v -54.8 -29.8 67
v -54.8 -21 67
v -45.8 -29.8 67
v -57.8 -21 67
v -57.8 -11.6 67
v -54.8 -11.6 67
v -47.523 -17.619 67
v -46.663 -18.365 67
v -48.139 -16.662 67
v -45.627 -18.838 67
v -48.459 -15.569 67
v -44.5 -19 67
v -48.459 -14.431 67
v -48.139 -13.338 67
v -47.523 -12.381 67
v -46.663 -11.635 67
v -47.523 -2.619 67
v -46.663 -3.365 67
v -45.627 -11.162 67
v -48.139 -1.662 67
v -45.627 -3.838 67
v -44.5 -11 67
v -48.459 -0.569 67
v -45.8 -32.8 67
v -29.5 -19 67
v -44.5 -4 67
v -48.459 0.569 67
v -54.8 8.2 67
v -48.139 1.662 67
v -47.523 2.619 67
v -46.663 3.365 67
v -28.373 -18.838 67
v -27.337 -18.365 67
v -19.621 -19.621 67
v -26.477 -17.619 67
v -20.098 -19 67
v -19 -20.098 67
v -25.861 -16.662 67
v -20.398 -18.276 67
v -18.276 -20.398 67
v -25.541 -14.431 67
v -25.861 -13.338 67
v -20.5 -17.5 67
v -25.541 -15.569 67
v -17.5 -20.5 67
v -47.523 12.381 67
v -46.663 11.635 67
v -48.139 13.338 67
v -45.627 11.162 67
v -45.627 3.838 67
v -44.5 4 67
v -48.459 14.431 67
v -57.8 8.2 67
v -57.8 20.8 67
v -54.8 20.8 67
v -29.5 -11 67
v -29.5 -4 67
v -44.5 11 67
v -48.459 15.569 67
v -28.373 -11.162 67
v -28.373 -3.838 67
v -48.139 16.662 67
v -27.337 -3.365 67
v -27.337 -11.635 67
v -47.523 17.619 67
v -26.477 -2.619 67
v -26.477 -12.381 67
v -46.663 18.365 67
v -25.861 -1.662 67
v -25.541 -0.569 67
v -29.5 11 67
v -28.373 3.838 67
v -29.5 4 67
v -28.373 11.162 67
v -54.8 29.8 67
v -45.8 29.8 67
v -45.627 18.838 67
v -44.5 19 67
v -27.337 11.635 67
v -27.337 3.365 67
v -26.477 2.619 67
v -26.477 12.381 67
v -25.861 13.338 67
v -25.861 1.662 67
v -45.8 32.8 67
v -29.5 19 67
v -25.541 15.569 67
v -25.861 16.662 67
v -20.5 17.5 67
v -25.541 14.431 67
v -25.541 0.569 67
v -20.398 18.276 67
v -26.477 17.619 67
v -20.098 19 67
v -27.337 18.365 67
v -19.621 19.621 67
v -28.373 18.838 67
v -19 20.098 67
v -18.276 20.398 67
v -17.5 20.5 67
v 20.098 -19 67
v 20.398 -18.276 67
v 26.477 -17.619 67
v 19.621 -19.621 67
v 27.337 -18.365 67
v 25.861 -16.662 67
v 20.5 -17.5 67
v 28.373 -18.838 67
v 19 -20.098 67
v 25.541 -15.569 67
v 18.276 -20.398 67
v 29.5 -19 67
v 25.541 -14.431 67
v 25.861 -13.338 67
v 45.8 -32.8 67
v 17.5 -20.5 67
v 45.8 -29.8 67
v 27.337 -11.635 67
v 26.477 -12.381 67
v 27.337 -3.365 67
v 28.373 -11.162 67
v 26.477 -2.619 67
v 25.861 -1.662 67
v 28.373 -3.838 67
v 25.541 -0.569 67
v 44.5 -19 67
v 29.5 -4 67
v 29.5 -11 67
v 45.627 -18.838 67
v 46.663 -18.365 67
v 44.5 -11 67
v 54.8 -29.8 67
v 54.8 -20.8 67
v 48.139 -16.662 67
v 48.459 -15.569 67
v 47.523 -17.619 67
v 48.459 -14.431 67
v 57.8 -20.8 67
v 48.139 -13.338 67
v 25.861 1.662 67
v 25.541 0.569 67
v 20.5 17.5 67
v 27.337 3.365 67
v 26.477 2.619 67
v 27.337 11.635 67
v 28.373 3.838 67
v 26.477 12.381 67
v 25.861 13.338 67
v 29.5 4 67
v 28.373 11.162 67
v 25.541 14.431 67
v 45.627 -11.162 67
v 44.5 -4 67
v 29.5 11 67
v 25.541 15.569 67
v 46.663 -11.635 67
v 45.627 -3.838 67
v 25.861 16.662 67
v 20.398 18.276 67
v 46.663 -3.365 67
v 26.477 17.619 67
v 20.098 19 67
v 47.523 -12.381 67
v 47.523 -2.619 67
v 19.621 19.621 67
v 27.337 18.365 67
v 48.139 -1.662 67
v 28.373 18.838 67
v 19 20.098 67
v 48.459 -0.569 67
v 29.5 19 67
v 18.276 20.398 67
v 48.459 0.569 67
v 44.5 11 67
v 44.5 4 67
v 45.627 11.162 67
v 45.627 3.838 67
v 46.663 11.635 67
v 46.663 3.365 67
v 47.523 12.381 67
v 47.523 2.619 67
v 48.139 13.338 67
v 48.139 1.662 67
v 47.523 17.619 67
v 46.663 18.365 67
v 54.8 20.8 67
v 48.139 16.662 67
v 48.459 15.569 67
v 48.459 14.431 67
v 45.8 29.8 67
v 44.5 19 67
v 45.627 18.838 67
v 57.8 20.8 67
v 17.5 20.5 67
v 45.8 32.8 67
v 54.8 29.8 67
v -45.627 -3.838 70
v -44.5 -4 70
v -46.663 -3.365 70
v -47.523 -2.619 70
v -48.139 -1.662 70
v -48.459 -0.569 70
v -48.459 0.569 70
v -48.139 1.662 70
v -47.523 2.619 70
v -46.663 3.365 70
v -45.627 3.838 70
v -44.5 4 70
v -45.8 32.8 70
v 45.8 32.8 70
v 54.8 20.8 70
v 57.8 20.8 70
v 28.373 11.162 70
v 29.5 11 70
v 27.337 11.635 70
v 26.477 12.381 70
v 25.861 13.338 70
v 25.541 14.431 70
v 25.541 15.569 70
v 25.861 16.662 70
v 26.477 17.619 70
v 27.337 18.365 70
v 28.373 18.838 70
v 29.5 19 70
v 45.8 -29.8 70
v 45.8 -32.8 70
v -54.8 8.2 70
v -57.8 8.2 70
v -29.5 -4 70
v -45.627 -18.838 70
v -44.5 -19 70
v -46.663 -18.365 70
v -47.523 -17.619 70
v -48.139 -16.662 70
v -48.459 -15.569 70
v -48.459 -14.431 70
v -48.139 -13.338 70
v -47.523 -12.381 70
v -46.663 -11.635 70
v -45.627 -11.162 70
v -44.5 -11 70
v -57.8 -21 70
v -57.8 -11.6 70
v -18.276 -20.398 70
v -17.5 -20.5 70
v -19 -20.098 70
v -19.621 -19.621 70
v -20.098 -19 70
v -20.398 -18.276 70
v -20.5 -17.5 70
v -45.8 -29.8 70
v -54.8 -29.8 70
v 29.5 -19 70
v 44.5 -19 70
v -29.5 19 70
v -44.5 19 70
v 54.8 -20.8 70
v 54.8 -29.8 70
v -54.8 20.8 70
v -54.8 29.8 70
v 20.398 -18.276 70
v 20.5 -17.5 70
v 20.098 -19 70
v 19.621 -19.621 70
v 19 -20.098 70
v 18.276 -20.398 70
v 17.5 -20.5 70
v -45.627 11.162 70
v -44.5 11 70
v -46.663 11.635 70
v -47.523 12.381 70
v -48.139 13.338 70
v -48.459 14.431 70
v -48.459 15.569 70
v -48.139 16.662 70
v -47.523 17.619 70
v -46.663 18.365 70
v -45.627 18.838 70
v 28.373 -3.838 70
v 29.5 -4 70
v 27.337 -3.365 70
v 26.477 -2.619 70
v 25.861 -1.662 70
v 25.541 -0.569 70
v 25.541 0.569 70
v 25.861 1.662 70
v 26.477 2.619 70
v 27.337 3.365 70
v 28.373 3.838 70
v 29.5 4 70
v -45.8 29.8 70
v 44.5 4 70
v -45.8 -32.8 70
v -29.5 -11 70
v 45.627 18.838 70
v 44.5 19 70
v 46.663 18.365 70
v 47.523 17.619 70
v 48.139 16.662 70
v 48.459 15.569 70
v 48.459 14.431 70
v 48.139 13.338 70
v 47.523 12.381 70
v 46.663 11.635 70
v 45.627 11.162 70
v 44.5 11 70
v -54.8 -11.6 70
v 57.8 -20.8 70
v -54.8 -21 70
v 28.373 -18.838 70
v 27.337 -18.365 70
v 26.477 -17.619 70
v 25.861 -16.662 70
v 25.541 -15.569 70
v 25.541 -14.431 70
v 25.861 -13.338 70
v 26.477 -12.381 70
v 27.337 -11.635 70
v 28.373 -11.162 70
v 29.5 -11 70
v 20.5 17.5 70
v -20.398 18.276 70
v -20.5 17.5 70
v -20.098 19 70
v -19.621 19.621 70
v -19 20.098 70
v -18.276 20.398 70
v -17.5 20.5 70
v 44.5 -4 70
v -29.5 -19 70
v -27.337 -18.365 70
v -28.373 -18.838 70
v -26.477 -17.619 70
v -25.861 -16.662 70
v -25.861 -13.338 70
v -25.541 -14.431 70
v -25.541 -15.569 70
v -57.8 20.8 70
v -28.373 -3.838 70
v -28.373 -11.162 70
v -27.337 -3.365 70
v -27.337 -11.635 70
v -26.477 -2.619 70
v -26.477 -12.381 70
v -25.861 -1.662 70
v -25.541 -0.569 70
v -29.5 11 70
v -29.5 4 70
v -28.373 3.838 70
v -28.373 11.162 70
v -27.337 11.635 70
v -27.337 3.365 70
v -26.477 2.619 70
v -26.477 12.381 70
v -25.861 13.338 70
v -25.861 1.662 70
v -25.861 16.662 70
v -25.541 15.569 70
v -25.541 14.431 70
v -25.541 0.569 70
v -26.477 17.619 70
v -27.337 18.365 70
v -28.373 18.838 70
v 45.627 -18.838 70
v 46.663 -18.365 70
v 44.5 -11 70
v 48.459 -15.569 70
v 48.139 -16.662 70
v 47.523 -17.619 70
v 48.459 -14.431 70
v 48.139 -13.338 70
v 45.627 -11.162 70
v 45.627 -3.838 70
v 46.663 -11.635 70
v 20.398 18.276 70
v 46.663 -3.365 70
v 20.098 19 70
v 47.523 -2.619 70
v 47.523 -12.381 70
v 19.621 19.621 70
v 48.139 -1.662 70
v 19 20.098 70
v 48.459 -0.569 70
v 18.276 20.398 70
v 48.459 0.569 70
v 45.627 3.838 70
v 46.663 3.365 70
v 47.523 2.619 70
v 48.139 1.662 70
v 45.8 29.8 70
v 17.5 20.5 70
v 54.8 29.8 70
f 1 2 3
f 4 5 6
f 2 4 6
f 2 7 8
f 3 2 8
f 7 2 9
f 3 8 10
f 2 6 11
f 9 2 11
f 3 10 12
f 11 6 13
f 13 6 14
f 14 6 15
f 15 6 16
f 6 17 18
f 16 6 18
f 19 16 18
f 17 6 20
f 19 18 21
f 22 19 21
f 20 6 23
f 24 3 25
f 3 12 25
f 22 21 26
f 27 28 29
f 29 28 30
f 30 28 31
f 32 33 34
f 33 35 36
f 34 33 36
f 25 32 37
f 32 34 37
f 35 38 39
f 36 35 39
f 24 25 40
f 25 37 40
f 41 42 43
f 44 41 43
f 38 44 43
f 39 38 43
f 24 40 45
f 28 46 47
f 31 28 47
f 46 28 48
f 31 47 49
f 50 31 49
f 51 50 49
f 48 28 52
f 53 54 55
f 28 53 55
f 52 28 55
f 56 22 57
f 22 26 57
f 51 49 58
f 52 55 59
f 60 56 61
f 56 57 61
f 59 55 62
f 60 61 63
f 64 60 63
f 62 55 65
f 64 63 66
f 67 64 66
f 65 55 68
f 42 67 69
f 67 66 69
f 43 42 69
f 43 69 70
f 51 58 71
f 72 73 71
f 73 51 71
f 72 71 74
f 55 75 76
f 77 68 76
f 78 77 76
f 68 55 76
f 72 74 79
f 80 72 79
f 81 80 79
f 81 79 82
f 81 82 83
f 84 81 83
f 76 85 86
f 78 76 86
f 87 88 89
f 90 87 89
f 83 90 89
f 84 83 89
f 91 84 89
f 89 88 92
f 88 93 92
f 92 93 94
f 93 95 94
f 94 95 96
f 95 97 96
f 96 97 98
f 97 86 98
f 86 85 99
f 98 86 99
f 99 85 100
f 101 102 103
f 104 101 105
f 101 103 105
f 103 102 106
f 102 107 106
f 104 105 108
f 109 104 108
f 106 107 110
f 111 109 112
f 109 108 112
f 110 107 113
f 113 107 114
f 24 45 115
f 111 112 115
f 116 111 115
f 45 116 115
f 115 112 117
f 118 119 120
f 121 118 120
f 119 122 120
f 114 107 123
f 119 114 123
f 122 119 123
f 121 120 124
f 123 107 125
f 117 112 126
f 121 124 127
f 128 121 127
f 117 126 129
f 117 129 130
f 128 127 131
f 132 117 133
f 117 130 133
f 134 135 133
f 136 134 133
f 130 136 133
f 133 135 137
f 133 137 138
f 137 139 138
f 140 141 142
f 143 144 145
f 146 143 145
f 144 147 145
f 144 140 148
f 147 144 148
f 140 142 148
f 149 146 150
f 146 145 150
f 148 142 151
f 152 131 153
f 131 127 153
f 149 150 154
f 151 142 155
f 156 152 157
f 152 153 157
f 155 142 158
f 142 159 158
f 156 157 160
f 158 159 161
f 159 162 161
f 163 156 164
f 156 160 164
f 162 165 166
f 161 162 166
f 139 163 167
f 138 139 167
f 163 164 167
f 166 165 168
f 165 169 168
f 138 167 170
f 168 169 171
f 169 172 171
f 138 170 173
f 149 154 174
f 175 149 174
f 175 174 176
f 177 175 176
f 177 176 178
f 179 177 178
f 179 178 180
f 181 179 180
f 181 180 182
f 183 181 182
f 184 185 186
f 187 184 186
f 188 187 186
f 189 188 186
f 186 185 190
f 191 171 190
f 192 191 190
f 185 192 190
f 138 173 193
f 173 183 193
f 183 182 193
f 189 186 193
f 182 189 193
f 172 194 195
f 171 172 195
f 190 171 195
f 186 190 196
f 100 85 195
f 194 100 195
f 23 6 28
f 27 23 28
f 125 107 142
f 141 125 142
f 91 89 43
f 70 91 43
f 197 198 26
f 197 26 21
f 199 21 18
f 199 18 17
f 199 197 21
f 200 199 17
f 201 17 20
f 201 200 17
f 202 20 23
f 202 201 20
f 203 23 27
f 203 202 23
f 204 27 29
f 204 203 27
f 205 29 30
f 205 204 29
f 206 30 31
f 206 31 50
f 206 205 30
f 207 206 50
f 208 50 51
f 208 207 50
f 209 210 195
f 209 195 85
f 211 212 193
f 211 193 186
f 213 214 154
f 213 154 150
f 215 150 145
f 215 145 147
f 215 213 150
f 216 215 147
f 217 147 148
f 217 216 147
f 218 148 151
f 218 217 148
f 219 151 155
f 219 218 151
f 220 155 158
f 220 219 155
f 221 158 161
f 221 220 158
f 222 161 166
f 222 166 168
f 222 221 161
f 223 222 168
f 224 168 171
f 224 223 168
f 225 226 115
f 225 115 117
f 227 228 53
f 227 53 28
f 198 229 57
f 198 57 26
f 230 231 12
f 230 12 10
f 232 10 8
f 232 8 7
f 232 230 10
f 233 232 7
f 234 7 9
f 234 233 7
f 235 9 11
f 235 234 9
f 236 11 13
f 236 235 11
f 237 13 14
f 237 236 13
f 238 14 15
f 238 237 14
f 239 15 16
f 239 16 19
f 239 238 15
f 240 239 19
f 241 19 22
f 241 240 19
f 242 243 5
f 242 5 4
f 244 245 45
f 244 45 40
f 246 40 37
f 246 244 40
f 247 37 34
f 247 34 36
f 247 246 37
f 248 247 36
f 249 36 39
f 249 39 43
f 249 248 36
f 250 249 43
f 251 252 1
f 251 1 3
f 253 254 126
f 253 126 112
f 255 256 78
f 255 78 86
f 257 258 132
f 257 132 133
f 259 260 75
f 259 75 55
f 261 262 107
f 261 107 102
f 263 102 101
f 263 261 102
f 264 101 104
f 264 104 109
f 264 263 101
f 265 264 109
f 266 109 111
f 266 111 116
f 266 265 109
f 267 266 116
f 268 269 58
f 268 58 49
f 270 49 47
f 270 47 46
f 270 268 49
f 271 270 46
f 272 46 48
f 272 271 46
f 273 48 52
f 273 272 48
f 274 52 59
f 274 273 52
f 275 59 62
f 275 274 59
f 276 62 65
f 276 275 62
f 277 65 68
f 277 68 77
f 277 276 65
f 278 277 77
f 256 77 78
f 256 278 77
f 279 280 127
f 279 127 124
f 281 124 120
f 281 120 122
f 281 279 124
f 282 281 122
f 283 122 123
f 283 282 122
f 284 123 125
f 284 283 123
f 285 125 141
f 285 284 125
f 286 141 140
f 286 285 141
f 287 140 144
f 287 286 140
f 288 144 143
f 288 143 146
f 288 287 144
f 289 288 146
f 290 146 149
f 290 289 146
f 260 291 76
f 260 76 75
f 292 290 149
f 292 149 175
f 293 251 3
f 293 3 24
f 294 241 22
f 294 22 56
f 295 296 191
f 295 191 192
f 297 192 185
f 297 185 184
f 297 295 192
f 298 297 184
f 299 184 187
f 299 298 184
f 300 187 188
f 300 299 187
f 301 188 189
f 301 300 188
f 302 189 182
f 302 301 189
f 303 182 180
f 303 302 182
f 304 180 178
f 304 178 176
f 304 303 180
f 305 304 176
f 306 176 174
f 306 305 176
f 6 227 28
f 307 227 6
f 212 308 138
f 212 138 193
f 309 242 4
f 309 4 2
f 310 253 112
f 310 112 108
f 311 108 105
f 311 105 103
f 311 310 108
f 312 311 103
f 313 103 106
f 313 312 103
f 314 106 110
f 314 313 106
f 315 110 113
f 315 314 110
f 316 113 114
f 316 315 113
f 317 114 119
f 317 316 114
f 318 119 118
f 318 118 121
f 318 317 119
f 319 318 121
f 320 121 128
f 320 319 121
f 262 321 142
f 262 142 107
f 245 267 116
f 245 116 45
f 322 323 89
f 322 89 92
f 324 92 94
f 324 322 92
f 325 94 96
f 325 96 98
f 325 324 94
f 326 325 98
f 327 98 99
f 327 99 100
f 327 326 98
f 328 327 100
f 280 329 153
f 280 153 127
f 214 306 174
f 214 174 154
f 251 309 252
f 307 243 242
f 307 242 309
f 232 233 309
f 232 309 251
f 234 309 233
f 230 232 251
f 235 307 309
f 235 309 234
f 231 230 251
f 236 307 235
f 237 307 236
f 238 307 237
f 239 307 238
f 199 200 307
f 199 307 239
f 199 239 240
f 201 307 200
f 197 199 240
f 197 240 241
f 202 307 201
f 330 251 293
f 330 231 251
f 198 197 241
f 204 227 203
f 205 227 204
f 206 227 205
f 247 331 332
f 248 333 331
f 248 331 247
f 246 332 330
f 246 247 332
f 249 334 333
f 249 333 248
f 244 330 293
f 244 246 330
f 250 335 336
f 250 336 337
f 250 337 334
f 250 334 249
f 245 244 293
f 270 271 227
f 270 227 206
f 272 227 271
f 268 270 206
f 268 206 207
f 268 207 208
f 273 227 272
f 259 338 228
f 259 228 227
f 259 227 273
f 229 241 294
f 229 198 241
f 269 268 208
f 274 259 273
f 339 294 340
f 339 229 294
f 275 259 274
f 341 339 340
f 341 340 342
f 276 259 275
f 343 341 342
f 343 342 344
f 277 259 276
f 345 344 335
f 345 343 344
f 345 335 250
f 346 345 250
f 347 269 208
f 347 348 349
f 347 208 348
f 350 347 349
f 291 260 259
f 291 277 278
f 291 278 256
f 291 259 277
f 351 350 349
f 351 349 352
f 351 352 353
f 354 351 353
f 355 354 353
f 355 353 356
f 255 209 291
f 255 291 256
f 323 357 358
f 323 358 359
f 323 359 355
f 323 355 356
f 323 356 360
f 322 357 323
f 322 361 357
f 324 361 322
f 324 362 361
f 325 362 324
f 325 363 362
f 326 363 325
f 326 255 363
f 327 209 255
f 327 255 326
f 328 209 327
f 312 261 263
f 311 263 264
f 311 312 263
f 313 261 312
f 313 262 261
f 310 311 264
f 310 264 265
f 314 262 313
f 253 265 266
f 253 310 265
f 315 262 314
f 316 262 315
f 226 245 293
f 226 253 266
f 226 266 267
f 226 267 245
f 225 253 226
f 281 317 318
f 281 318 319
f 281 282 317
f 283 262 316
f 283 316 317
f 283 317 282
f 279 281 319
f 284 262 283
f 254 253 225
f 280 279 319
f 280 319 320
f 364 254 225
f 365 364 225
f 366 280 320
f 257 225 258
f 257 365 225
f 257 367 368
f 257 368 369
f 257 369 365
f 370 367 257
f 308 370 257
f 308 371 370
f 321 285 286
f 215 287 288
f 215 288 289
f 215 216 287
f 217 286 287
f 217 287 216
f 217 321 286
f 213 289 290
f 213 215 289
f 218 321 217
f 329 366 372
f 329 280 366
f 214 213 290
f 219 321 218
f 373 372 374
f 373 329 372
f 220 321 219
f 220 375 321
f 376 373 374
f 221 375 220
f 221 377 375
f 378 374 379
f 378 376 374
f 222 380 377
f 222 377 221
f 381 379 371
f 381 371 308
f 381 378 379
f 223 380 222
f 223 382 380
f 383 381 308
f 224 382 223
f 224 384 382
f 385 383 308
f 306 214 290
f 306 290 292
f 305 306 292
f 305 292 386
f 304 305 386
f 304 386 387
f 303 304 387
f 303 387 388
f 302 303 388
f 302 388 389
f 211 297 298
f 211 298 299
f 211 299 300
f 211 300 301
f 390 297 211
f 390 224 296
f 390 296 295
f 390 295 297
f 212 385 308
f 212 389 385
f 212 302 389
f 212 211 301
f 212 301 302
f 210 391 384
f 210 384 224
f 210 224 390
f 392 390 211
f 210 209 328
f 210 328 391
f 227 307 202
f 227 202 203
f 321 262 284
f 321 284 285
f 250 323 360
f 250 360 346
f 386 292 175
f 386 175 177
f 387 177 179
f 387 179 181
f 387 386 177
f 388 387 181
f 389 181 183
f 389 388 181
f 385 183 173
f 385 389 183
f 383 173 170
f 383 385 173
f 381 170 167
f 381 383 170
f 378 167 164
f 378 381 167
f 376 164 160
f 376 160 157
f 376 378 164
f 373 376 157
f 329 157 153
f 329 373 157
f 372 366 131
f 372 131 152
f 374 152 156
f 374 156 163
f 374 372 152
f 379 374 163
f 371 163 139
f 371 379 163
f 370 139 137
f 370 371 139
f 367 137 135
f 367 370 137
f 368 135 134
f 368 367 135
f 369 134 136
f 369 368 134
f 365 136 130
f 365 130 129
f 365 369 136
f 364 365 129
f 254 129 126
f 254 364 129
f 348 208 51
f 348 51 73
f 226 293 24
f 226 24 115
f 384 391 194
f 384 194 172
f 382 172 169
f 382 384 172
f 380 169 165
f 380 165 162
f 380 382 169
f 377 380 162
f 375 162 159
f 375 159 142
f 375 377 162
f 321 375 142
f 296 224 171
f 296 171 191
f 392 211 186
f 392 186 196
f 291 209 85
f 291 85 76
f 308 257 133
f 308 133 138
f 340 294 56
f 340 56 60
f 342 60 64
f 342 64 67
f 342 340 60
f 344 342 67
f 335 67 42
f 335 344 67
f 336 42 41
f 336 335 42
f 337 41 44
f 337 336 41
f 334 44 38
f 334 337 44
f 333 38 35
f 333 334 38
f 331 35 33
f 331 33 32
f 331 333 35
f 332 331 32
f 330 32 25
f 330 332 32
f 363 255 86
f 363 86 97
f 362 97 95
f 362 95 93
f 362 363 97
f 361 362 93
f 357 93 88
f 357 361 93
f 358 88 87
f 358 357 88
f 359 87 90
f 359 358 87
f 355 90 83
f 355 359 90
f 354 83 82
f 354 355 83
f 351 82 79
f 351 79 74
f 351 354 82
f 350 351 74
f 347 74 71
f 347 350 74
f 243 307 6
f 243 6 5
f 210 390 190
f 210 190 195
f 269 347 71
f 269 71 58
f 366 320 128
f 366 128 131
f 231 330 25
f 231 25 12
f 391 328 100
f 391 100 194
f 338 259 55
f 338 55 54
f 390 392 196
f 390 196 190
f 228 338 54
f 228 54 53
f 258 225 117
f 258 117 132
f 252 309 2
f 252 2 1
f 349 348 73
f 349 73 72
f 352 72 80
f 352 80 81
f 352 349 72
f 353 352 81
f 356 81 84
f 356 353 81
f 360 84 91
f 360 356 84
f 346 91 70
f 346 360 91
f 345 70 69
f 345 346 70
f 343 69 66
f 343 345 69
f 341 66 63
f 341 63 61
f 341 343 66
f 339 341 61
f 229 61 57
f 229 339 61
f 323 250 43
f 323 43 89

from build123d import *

# Parameters (mm, degrees)
EXTRUDE_2_DEPTH = 3


with BuildPart() as part:
    # 스케치5 → 보스-돌출2 (new body)
    with BuildSketch(Plane.XY.offset(70)):
        Polygon((54.8, -20.8), (57.8, -20.8), (57.8, 20.8), (54.8, 20.8), (54.8, 29.8), (45.8, 29.8), (45.8, 32.8), (-45.8, 32.8), (-45.8, 29.8), (-54.8, 29.8), (-54.8, 20.8), (-57.8, 20.8), (-57.8, 8.2), (-54.8, 8.2), (-54.8, -11.6), (-57.8, -11.6), (-57.8, -21), (-54.8, -21), (-54.8, -29.8), (-45.8, -29.8), (-45.8, -32.8), (45.8, -32.8), (45.8, -29.8), (54.8, -29.8), align=None)
        with BuildLine():
            Line((-17.5, 20.5), (17.5, 20.5))
            ThreePointArc((17.5, 20.5), (19.621320344, 19.621320344), (20.5, 17.5))
            Line((20.5, 17.5), (20.5, -17.5))
            ThreePointArc((20.5, -17.5), (19.621320344, -19.621320344), (17.5, -20.5))
            Line((17.5, -20.5), (-17.5, -20.5))
            ThreePointArc((-17.5, -20.5), (-19.621320344, -19.621320344), (-20.5, -17.5))
            Line((-20.5, -17.5), (-20.5, 17.5))
            ThreePointArc((-20.5, 17.5), (-19.621320344, 19.621320344), (-17.5, 20.5))
        make_face(mode=Mode.SUBTRACT)
        with BuildLine():
            Line((-29.5, 11), (-44.5, 11))
            ThreePointArc((-44.5, 11), (-48.5, 15), (-44.5, 19))
            Line((-44.5, 19), (-29.5, 19))
            ThreePointArc((-29.5, 19), (-25.5, 15), (-29.5, 11))
        make_face(mode=Mode.SUBTRACT)
        with BuildLine():
            Line((29.5, -11), (44.5, -11))
            ThreePointArc((44.5, -11), (48.5, -15), (44.5, -19))
            Line((44.5, -19), (29.5, -19))
            ThreePointArc((29.5, -19), (25.5, -15), (29.5, -11))
        make_face(mode=Mode.SUBTRACT)
        with BuildLine():
            Line((29.5, 4), (44.5, 4))
            ThreePointArc((44.5, 4), (48.5, 0), (44.5, -4))
            Line((44.5, -4), (29.5, -4))
            ThreePointArc((29.5, -4), (25.5, 0), (29.5, 4))
        make_face(mode=Mode.SUBTRACT)
        with BuildLine():
            Line((29.5, 19), (44.5, 19))
            ThreePointArc((44.5, 19), (48.5, 15), (44.5, 11))
            Line((44.5, 11), (29.5, 11))
            ThreePointArc((29.5, 11), (25.5, 15), (29.5, 19))
        make_face(mode=Mode.SUBTRACT)
        with BuildLine():
            Line((-29.5, -19), (-44.5, -19))
            ThreePointArc((-44.5, -19), (-48.5, -15), (-44.5, -11))
            Line((-44.5, -11), (-29.5, -11))
            ThreePointArc((-29.5, -11), (-25.5, -15), (-29.5, -19))
        make_face(mode=Mode.SUBTRACT)
        with BuildLine():
            Line((-29.5, -4), (-44.5, -4))
            ThreePointArc((-44.5, -4), (-48.5, 0), (-44.5, 4))
            Line((-44.5, 4), (-29.5, 4))
            ThreePointArc((-29.5, 4), (-25.5, 0), (-29.5, -4))
        make_face(mode=Mode.SUBTRACT)
    extrude(amount=-EXTRUDE_2_DEPTH)


solid = part.part
